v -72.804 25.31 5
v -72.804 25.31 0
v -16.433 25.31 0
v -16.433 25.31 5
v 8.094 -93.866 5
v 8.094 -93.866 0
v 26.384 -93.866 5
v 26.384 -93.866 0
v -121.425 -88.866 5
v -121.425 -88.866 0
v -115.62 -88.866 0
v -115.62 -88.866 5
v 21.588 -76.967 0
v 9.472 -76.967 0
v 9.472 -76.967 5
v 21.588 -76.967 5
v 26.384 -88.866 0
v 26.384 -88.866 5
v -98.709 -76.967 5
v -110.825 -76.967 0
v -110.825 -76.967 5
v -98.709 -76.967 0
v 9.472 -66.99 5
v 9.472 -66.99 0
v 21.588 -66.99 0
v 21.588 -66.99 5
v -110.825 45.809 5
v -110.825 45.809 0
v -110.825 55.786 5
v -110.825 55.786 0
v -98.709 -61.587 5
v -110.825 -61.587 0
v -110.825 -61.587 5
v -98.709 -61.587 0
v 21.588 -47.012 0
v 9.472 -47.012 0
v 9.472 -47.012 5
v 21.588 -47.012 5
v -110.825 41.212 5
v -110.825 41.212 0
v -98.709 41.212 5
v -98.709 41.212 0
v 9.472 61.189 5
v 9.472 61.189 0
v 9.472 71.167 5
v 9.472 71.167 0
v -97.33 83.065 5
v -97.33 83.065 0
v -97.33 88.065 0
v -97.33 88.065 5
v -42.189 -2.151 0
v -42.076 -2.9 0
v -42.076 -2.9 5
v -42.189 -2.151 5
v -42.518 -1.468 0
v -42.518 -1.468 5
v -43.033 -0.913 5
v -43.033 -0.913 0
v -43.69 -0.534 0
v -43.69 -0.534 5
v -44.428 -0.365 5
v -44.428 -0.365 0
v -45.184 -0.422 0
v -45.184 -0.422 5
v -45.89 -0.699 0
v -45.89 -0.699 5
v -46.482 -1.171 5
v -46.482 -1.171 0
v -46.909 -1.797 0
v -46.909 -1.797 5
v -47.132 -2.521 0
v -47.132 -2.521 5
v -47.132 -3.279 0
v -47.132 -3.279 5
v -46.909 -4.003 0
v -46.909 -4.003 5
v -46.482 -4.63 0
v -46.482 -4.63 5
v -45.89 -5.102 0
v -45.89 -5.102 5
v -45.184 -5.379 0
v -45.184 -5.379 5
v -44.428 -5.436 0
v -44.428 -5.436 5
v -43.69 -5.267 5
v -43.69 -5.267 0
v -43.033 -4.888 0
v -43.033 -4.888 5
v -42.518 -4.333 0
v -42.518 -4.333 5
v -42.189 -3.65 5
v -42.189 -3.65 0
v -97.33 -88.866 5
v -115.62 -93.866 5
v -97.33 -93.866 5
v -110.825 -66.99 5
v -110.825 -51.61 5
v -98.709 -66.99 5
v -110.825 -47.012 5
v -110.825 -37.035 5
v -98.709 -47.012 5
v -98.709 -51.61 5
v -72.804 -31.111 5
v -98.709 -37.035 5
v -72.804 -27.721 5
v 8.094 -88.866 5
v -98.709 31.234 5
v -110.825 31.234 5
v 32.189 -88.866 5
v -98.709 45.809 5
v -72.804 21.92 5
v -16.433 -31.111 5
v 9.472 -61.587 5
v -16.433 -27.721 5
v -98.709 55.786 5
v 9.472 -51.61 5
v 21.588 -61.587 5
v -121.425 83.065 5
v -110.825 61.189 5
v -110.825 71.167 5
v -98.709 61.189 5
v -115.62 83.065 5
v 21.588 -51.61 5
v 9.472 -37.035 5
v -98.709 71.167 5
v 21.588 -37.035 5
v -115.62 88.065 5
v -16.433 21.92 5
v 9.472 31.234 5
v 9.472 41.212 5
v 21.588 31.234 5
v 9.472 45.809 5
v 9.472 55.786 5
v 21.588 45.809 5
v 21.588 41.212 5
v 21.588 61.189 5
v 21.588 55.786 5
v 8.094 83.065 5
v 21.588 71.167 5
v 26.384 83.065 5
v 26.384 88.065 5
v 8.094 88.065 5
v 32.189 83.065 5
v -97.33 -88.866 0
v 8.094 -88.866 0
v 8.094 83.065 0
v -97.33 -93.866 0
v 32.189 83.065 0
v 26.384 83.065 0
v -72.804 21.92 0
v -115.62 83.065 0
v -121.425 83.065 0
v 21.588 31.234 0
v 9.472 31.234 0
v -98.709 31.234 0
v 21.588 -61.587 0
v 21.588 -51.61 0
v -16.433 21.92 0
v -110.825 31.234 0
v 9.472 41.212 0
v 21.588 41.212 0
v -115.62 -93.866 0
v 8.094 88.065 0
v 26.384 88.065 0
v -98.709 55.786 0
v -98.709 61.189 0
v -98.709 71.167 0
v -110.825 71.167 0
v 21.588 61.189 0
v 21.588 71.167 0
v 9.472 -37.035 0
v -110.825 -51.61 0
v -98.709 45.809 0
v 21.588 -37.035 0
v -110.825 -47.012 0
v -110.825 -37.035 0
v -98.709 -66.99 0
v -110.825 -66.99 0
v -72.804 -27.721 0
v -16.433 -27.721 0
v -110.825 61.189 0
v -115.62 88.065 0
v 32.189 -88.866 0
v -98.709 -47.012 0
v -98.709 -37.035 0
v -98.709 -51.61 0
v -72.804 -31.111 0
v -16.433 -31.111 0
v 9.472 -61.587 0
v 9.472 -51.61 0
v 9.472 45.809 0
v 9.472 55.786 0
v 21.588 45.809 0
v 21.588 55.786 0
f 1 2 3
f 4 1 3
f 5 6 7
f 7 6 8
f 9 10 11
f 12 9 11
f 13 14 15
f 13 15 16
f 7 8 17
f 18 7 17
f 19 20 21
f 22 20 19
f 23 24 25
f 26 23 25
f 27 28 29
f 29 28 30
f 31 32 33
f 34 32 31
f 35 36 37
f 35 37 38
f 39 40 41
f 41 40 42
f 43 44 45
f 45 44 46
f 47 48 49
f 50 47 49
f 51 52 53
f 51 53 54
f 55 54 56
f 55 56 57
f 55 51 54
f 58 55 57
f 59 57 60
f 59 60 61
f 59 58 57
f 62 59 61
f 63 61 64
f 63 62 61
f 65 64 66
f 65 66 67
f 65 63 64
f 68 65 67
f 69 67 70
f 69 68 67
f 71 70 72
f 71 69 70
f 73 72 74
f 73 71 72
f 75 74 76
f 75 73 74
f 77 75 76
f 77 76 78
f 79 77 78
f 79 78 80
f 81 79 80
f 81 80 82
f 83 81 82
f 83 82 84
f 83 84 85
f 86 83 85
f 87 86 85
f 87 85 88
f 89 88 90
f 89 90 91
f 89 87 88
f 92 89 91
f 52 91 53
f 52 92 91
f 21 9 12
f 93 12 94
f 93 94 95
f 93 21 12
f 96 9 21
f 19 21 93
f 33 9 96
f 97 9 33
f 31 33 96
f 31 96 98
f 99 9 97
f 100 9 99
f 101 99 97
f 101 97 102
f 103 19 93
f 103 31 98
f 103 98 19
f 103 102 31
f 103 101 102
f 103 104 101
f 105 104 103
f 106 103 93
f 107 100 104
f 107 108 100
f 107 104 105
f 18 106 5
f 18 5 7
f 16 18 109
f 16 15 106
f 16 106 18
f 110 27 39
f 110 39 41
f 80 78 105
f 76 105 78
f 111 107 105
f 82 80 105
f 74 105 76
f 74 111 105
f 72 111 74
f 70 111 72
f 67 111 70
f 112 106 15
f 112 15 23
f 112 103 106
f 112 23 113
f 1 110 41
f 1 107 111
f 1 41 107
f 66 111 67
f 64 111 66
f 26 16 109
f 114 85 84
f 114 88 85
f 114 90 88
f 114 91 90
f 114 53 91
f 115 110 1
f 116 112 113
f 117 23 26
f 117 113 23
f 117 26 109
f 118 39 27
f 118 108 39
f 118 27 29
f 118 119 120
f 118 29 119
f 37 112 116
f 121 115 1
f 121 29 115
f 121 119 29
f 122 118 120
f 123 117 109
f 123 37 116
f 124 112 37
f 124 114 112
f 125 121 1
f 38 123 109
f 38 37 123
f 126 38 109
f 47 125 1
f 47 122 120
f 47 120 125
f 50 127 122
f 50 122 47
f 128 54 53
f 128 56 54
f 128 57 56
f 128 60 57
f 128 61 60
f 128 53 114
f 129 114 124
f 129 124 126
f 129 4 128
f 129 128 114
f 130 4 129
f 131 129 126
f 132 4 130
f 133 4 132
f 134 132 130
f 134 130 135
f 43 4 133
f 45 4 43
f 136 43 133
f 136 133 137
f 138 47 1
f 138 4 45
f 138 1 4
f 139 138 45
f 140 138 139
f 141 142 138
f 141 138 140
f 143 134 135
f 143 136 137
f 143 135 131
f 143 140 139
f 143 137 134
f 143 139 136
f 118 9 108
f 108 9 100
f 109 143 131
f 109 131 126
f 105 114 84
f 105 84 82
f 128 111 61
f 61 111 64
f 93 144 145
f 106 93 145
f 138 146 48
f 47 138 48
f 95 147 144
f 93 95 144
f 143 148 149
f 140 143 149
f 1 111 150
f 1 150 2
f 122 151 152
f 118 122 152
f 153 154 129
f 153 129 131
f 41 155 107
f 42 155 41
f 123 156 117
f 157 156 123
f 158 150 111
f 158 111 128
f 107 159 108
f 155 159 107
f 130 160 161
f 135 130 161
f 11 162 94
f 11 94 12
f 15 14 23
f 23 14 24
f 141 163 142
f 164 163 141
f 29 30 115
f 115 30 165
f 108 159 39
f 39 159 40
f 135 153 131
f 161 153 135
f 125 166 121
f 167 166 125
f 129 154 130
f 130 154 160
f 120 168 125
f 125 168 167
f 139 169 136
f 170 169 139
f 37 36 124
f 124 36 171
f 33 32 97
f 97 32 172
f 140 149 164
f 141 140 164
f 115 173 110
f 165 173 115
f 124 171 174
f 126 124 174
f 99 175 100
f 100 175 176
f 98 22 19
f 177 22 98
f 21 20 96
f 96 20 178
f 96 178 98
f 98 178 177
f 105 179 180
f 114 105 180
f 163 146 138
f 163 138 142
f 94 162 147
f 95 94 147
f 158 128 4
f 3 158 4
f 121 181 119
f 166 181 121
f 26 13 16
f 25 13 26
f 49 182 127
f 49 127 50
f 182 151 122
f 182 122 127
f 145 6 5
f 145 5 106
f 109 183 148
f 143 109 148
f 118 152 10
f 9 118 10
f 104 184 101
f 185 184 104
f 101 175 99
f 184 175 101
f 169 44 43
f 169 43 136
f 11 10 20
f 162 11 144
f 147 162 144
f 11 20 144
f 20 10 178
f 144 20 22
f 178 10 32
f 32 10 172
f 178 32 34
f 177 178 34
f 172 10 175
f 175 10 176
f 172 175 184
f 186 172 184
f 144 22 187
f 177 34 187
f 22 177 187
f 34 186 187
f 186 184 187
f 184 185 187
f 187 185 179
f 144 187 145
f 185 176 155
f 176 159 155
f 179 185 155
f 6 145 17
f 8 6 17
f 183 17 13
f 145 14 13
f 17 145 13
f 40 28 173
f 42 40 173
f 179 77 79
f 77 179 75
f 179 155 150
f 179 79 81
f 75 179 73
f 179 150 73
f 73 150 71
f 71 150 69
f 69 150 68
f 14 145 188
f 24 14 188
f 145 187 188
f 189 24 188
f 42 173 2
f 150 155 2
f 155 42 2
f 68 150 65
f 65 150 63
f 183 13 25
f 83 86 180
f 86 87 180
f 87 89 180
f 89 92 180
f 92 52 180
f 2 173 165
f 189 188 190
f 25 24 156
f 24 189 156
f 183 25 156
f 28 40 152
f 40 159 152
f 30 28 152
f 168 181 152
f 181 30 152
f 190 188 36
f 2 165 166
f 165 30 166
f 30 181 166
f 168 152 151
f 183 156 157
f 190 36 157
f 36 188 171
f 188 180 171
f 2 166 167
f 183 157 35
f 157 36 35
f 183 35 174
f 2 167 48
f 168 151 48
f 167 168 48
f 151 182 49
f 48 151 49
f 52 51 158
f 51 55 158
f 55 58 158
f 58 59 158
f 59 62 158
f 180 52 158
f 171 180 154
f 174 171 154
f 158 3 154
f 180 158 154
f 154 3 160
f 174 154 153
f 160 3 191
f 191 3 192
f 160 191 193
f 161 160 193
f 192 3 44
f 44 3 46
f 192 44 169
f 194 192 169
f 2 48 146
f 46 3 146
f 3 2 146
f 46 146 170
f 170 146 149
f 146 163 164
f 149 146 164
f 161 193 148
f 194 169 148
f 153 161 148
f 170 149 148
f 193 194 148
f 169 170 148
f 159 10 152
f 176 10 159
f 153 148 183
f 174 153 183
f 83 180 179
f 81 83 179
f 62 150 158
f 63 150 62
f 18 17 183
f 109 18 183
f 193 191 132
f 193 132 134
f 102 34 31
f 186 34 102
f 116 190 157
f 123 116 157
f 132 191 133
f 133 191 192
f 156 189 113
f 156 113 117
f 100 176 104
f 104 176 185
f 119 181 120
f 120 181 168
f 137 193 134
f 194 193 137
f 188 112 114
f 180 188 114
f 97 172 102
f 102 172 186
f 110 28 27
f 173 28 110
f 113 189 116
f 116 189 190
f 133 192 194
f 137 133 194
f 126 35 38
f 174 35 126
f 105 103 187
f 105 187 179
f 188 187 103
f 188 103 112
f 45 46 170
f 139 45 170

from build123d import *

# Parameters (mm, degrees)
F0_W     = 12.115448
F0_H     = 9.97743
F0_W_2   = 56.370701
F0_H_2   = 3.390066
F0_R     = 2.542431
F0_W_3   = 18.290117
F0_H_3   = 5
F1_DEPTH = 5


with BuildPart() as f1:
    # F0 (on Top) → F1 (new body)
    with BuildSketch(Plane.XY):
        Polygon((-115.620404, 83.065476), (-121.425346, 83.065476), (-121.425346, -88.866214), (-115.620404, -88.866214), (-97.330287, -88.866214), (8.093566, -88.866214), (26.383683, -88.866214), (32.188624, -88.866214), (32.188624, 83.065476), (26.383683, 83.065476), (8.093566, 83.065476), (-91.525346, 83.065476), (-97.330287, 83.065476), align=None)
        with Locations((-104.766935, -71.978614)):
            Rectangle(F0_W, F0_H, mode=Mode.SUBTRACT)
        with Locations((-104.766935, -56.598406)):
            Rectangle(F0_W, F0_H, mode=Mode.SUBTRACT)
        with Locations((-104.766935, -42.02375)):
            Rectangle(F0_W, F0_H, mode=Mode.SUBTRACT)
        with Locations((15.530214, -71.978614)):
            Rectangle(F0_W, F0_H, mode=Mode.SUBTRACT)
        with Locations((15.530214, -56.598406)):
            Rectangle(F0_W, F0_H, mode=Mode.SUBTRACT)
        with Locations((-44.61836, -29.415544)):
            Rectangle(F0_W_2, F0_H_2, mode=Mode.SUBTRACT)
        with Locations((15.530214, -42.02375)):
            Rectangle(F0_W, F0_H, mode=Mode.SUBTRACT)
        with Locations((-104.766935, 36.223011)):
            Rectangle(F0_W, F0_H, mode=Mode.SUBTRACT)
        with Locations((-104.766935, 50.797667)):
            Rectangle(F0_W, F0_H, mode=Mode.SUBTRACT)
        with Locations((-104.766935, 66.177875)):
            Rectangle(F0_W, F0_H, mode=Mode.SUBTRACT)
        with Locations((-44.618361, -2.900369)):
            Circle(F0_R, mode=Mode.SUBTRACT)
        with Locations((-44.61836, 23.614805)):
            Rectangle(F0_W_2, F0_H_2, mode=Mode.SUBTRACT)
        with Locations((15.530214, 36.223011)):
            Rectangle(F0_W, F0_H, mode=Mode.SUBTRACT)
        with Locations((15.530214, 50.797667)):
            Rectangle(F0_W, F0_H, mode=Mode.SUBTRACT)
        with Locations((15.530214, 66.177875)):
            Rectangle(F0_W, F0_H, mode=Mode.SUBTRACT)
        with Locations((-106.475346, 85.565476)):
            Rectangle(F0_W_3, F0_H_3)
        with Locations((-106.475346, -91.366214)):
            Rectangle(F0_W_3, F0_H_3)
        with Locations((17.238625, -91.366214)):
            Rectangle(F0_W_3, F0_H_3)
        with Locations((17.238625, 85.565476)):
            Rectangle(F0_W_3, F0_H_3)
    extrude(amount=F1_DEPTH)


solid = f1.part
